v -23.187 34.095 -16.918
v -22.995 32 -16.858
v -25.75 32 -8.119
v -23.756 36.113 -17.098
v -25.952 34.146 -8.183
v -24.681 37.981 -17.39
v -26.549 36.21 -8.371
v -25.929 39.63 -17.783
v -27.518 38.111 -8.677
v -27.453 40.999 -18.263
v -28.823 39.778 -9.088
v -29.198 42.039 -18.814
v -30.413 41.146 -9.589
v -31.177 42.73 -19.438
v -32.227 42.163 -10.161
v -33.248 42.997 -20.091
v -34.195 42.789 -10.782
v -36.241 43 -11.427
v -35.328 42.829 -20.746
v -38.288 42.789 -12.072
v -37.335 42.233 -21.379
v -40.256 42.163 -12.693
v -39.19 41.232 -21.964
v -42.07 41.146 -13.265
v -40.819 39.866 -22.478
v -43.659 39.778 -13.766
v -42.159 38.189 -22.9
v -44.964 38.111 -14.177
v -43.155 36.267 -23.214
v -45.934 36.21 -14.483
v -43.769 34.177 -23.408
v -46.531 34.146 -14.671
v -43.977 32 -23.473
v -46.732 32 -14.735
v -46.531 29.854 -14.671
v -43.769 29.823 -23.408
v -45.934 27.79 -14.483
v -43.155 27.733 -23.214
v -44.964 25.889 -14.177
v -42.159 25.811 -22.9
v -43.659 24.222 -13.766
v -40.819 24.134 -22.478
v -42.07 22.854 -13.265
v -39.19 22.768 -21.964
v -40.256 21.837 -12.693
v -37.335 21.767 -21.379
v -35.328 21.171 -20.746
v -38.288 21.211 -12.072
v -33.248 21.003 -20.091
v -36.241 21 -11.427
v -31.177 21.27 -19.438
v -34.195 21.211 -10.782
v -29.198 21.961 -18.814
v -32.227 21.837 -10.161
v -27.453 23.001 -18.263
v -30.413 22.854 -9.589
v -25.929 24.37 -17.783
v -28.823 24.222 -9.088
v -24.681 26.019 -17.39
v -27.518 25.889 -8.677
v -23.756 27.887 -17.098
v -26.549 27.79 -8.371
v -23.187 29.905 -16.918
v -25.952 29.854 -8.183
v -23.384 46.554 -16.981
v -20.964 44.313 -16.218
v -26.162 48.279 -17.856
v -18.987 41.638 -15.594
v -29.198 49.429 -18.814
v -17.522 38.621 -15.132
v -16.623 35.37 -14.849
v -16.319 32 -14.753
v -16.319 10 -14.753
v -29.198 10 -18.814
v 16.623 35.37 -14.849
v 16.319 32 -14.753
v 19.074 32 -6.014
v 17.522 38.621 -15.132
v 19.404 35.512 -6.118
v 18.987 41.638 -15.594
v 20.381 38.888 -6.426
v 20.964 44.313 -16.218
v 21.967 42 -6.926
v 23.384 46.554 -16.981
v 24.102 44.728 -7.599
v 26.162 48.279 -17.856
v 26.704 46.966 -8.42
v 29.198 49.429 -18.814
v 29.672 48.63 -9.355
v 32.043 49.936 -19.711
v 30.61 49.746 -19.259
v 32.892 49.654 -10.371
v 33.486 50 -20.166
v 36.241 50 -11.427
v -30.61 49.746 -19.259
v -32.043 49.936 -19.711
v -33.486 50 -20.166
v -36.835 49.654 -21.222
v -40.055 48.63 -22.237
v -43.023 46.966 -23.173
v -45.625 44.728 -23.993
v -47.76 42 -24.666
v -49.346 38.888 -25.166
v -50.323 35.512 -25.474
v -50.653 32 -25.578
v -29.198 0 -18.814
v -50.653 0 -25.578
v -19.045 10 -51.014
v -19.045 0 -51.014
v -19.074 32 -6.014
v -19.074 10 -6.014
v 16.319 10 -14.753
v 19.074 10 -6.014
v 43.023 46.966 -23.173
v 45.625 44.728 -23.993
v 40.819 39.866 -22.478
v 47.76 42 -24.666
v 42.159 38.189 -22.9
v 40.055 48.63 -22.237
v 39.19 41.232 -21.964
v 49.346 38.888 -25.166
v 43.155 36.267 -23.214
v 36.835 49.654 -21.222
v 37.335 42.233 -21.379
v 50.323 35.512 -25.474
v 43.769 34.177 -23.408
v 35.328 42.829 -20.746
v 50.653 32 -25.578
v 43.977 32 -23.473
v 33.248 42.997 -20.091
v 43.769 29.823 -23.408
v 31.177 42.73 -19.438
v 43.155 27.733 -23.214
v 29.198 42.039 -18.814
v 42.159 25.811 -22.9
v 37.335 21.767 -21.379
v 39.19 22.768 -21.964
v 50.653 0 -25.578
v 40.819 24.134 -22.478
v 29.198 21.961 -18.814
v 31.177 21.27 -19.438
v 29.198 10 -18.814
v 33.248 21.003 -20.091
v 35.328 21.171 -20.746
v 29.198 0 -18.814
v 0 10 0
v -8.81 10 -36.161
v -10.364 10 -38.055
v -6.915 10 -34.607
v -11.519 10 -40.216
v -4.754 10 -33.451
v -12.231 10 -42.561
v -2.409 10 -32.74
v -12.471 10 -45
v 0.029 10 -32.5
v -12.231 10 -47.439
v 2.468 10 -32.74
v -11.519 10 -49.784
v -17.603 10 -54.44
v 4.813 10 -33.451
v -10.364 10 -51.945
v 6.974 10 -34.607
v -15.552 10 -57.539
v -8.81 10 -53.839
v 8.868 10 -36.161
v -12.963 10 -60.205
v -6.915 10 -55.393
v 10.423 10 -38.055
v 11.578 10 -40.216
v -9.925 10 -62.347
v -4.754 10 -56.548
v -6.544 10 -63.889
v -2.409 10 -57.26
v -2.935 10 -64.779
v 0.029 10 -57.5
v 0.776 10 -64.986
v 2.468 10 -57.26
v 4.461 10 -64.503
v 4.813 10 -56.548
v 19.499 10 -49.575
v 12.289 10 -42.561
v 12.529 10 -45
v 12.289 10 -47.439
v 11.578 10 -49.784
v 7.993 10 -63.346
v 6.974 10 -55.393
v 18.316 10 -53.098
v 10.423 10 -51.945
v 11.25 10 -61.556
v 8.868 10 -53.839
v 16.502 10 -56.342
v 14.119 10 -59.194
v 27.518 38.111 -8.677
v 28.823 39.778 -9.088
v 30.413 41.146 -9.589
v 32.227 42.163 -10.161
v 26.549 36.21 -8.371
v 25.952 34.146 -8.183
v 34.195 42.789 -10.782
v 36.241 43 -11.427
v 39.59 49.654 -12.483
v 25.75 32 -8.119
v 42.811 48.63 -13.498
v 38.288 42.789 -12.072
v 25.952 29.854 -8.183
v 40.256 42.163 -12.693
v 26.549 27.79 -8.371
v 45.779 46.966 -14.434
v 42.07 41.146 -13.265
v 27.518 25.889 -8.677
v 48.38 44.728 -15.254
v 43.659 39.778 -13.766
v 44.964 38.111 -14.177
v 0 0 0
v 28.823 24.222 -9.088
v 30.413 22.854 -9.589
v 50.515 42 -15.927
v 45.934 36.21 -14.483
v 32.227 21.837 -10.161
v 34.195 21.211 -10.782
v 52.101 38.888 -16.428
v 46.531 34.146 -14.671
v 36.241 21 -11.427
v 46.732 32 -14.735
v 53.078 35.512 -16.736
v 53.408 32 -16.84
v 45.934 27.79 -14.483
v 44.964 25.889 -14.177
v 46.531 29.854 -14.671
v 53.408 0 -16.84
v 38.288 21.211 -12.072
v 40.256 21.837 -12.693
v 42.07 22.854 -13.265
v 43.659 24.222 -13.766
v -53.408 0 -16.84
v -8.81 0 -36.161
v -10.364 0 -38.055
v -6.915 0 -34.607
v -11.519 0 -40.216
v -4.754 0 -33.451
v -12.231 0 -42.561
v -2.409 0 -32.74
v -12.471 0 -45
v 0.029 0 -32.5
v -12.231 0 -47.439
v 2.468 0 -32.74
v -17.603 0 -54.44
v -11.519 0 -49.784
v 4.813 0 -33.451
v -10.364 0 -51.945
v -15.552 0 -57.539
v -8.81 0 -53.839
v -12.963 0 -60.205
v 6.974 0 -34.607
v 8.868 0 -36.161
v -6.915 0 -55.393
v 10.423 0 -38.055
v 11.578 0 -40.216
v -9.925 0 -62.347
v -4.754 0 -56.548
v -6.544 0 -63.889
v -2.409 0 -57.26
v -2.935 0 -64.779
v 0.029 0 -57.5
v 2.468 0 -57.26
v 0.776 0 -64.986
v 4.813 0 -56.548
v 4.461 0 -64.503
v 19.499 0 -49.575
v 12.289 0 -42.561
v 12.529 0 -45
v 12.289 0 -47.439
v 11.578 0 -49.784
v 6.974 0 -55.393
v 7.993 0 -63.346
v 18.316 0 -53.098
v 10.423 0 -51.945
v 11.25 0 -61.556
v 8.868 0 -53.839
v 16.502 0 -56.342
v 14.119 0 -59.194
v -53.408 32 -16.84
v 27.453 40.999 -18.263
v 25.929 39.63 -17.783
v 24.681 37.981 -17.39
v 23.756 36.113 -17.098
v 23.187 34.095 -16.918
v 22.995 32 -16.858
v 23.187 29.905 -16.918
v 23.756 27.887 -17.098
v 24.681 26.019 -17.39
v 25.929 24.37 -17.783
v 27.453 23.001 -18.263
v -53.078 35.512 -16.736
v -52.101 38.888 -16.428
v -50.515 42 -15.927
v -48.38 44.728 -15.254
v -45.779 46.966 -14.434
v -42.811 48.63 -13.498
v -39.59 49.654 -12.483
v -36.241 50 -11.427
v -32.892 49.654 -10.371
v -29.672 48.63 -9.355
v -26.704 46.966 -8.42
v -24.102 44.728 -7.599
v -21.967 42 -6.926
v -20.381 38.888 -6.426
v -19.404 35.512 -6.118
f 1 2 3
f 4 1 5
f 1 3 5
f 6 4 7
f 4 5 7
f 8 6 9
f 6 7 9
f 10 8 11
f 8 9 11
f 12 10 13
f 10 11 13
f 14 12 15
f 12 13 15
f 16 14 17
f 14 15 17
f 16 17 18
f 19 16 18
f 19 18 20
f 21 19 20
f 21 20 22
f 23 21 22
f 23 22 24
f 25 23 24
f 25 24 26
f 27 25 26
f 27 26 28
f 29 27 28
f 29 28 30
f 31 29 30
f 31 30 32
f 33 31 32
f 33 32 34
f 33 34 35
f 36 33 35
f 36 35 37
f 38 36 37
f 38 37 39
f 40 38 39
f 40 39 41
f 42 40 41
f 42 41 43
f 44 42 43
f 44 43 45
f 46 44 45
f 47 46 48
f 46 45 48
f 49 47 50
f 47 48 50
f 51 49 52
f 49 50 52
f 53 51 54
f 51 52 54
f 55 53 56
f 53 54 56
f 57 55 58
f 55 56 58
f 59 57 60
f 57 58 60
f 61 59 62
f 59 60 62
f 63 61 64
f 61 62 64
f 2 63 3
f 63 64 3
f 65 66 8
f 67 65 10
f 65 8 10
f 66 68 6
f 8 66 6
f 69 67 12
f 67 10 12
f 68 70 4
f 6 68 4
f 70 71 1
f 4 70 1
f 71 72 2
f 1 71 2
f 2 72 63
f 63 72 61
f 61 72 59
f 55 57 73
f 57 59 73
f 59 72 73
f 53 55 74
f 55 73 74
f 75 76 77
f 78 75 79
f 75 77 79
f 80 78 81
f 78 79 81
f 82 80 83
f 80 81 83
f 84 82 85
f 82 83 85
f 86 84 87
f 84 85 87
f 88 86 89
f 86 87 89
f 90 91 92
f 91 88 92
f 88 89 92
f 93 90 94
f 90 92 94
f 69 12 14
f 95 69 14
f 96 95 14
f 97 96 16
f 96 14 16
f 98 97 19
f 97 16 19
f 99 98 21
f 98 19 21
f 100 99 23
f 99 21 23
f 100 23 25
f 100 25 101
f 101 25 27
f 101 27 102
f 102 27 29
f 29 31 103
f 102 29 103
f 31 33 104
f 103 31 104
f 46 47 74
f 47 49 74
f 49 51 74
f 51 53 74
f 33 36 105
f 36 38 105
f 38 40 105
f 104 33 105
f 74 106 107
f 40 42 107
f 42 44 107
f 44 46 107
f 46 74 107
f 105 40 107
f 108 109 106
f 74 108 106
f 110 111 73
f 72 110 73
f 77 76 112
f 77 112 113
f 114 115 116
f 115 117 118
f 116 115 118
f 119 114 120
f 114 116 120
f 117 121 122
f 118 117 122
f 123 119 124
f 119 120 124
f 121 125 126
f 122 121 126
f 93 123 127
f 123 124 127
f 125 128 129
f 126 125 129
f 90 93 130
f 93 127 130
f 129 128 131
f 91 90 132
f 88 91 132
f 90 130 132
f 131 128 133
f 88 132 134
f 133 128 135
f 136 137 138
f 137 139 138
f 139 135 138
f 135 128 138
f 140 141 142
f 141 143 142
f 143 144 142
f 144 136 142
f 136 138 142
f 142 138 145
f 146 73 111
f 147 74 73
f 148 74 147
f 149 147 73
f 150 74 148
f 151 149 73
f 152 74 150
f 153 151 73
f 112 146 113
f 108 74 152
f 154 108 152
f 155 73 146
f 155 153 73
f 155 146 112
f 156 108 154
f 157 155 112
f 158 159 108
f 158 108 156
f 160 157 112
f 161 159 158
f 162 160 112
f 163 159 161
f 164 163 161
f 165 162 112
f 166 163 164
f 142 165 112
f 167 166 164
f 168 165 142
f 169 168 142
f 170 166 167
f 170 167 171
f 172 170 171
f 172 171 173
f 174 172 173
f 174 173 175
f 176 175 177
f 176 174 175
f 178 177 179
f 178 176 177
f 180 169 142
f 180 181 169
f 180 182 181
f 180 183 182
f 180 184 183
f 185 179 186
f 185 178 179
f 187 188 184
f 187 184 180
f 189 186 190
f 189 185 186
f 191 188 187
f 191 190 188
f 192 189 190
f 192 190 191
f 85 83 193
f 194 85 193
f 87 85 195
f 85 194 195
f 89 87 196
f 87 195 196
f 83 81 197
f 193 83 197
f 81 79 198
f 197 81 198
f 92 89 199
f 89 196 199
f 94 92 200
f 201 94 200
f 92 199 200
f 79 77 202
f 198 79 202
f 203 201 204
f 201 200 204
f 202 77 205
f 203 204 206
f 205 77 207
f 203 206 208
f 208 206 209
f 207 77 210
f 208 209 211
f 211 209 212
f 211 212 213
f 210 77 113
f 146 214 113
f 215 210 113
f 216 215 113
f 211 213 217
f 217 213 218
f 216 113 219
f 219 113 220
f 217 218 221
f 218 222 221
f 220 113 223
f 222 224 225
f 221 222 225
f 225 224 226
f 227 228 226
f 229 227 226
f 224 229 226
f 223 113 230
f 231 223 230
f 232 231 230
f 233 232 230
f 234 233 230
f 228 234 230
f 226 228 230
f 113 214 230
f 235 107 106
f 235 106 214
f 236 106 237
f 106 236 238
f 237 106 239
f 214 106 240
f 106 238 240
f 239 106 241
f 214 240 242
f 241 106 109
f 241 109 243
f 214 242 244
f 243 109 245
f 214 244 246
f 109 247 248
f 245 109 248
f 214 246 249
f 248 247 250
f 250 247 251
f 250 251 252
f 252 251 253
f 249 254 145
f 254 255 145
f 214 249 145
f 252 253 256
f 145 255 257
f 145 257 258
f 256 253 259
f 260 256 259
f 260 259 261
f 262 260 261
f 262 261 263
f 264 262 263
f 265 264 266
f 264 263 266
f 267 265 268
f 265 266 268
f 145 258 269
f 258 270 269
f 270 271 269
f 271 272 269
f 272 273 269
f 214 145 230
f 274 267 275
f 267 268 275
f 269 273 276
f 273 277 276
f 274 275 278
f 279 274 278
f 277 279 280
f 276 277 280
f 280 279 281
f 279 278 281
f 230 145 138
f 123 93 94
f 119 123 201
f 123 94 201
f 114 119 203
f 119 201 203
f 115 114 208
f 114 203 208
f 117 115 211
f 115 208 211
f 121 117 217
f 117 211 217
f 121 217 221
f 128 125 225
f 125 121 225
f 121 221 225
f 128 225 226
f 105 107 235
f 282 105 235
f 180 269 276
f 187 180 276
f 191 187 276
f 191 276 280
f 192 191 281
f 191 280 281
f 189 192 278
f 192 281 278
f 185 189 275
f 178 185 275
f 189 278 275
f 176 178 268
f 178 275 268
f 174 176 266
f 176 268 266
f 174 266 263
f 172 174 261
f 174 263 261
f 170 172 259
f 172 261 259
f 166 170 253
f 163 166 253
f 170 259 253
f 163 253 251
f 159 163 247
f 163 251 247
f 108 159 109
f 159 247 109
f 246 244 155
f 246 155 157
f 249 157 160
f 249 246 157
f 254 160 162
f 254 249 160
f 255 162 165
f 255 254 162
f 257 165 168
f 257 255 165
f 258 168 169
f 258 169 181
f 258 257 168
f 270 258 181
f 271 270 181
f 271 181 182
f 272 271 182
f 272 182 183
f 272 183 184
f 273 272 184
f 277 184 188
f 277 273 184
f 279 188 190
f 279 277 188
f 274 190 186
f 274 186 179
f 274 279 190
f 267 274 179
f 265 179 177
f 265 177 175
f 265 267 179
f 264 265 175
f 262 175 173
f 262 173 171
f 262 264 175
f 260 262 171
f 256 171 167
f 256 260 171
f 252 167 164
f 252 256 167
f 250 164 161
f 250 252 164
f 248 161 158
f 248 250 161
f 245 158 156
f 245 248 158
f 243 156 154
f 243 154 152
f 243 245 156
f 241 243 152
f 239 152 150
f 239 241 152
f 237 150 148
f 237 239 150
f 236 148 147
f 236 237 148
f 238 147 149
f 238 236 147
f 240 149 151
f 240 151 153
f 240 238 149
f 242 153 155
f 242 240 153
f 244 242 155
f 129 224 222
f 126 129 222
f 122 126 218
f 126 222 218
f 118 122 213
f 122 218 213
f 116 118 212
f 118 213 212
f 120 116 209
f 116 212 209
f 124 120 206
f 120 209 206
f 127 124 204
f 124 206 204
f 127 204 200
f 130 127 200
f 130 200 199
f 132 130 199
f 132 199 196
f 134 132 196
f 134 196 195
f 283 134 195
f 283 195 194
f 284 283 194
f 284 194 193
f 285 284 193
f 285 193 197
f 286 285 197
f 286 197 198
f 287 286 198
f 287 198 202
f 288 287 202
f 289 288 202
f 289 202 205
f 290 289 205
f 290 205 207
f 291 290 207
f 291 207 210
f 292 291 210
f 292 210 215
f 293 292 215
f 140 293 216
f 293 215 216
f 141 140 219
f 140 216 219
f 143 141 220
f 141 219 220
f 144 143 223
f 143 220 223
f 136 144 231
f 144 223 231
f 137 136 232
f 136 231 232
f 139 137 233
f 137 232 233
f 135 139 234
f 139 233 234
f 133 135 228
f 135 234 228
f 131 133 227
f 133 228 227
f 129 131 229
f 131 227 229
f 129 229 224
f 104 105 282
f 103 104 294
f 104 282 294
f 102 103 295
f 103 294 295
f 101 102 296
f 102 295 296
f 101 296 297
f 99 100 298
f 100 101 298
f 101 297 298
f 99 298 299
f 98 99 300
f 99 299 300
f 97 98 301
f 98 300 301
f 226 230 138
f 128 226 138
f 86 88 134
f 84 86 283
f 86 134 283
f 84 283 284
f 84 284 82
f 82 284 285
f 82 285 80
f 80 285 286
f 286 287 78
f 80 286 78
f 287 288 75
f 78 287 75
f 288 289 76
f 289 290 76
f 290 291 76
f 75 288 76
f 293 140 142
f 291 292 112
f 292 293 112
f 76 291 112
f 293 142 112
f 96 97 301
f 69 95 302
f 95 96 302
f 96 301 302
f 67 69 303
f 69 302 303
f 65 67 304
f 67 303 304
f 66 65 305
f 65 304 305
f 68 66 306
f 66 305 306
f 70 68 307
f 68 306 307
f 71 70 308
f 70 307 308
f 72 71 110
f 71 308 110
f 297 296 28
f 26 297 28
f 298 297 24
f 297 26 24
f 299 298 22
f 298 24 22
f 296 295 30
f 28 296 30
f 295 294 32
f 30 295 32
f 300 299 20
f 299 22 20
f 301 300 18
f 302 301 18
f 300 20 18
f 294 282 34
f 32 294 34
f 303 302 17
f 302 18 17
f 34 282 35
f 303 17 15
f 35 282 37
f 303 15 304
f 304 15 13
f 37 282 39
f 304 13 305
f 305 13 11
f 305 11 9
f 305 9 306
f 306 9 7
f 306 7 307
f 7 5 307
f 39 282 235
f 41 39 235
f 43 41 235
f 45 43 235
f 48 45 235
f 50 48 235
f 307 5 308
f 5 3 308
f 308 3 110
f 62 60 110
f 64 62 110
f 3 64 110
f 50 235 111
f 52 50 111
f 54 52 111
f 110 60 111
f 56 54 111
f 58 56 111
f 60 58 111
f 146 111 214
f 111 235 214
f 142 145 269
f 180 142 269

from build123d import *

# Parameters (mm, degrees)
SKETCH2_R           = 12.5
BOSS_EXTRUDE1_DEPTH = 10
BOSS_EXTRUDE2_DEPTH = 50
SKETCH5_R           = 11
CUT_EXTRUDE3_DEPTH  = 20
SKETCH3_R           = 11
CUT_EXTRUDE4_DEPTH  = 20


with BuildPart() as part:
    # Sketch2 → Boss-Extrude1 (new body)
    with BuildSketch(Plane(origin=(0, 0, 0), x_dir=(1, 0, 0), z_dir=(0, 1, 0))):
        with BuildLine():
            Line((-19.074339015, 6.01411599), (0, 0))
            Line((0, 0), (19.074339015, 6.01411599))
            Line((19.074339015, 6.01411599), (16.318990173, 14.752966055))
            Line((16.318990173, 14.752966055), (29.197895289, 18.81366924))
            Line((29.197895289, 18.81366924), (19.498961292, 49.574757892))
            ThreePointArc((19.498961292, 49.574757892), (0.775540523, 64.986060166), (-19.045136415, 51.014106515))
            Line((-19.045136415, 51.014106515), (-29.197895289, 18.81366924))
            Line((-29.197895289, 18.81366924), (-16.318990173, 14.752966055))
            Line((-16.318990173, 14.752966055), (-19.074339015, 6.01411599))
        make_face()
        with Locations((0.0292026, 44.999990525)):
            Circle(SKETCH2_R, mode=Mode.SUBTRACT)
    extrude(amount=BOSS_EXTRUDE1_DEPTH)

    # Sketch2<4> → Boss-Extrude2 (add)
    with BuildSketch(Plane(origin=(0, 0, 0), x_dir=(1, 0, 0), z_dir=(0, 1, 0))):
        Polygon((16.318990173, 14.752966055), (19.074339015, 6.01411599), (53.408149242, 16.839524772), (50.6528004, 25.578374837), align=None)
        Polygon((-53.408149242, 16.839524772), (-19.074339015, 6.01411599), (-16.318990173, 14.752966055), (-50.6528004, 25.578374837), align=None)
    extrude(amount=BOSS_EXTRUDE2_DEPTH)

    # Sketch5 → Cut-Extrude3 (cut)
    with BuildSketch(Plane(origin=(0, 0, 0), x_dir=(0.9537169507482267, 0, -0.30070579950427406), z_dir=(0.300705799504274, 0, 0.9537169507482266))):
        with Locations((38, 32)):
            Circle(SKETCH5_R)
        with BuildLine():
            ThreePointArc((20, 32), (25.272077939, 44.727922061), (38, 50))
            Line((38, 50), (20, 50))
            Line((20, 50), (20, 32))
        make_face()
        with BuildLine():
            ThreePointArc((38, 50), (50.727922061, 44.727922061), (56, 32))
            Line((56, 32), (56, 50))
            Line((56, 50), (38, 50))
        make_face()
    extrude(amount=-CUT_EXTRUDE3_DEPTH, mode=Mode.SUBTRACT)

    # Sketch3 → Cut-Extrude4 (cut)
    with BuildSketch(Plane(origin=(0, 0, 0), x_dir=(0.9537169507482267, 0, 0.30070579950427406), z_dir=(-0.300705799504274, 0, 0.9537169507482266))):
        with BuildLine():
            ThreePointArc((-38, 50), (-25.272077939, 44.727922061), (-20, 32))
            Line((-20, 32), (-20, 50))
            Line((-20, 50), (-38, 50))
        make_face()
        with Locations((-38, 32)):
            Circle(SKETCH3_R)
        with BuildLine():
            ThreePointArc((-56, 32), (-50.727922061, 44.727922061), (-38, 50))
            Line((-38, 50), (-56, 50))
            Line((-56, 50), (-56, 32))
        make_face()
    extrude(amount=-CUT_EXTRUDE4_DEPTH, mode=Mode.SUBTRACT)


solid = part.part
